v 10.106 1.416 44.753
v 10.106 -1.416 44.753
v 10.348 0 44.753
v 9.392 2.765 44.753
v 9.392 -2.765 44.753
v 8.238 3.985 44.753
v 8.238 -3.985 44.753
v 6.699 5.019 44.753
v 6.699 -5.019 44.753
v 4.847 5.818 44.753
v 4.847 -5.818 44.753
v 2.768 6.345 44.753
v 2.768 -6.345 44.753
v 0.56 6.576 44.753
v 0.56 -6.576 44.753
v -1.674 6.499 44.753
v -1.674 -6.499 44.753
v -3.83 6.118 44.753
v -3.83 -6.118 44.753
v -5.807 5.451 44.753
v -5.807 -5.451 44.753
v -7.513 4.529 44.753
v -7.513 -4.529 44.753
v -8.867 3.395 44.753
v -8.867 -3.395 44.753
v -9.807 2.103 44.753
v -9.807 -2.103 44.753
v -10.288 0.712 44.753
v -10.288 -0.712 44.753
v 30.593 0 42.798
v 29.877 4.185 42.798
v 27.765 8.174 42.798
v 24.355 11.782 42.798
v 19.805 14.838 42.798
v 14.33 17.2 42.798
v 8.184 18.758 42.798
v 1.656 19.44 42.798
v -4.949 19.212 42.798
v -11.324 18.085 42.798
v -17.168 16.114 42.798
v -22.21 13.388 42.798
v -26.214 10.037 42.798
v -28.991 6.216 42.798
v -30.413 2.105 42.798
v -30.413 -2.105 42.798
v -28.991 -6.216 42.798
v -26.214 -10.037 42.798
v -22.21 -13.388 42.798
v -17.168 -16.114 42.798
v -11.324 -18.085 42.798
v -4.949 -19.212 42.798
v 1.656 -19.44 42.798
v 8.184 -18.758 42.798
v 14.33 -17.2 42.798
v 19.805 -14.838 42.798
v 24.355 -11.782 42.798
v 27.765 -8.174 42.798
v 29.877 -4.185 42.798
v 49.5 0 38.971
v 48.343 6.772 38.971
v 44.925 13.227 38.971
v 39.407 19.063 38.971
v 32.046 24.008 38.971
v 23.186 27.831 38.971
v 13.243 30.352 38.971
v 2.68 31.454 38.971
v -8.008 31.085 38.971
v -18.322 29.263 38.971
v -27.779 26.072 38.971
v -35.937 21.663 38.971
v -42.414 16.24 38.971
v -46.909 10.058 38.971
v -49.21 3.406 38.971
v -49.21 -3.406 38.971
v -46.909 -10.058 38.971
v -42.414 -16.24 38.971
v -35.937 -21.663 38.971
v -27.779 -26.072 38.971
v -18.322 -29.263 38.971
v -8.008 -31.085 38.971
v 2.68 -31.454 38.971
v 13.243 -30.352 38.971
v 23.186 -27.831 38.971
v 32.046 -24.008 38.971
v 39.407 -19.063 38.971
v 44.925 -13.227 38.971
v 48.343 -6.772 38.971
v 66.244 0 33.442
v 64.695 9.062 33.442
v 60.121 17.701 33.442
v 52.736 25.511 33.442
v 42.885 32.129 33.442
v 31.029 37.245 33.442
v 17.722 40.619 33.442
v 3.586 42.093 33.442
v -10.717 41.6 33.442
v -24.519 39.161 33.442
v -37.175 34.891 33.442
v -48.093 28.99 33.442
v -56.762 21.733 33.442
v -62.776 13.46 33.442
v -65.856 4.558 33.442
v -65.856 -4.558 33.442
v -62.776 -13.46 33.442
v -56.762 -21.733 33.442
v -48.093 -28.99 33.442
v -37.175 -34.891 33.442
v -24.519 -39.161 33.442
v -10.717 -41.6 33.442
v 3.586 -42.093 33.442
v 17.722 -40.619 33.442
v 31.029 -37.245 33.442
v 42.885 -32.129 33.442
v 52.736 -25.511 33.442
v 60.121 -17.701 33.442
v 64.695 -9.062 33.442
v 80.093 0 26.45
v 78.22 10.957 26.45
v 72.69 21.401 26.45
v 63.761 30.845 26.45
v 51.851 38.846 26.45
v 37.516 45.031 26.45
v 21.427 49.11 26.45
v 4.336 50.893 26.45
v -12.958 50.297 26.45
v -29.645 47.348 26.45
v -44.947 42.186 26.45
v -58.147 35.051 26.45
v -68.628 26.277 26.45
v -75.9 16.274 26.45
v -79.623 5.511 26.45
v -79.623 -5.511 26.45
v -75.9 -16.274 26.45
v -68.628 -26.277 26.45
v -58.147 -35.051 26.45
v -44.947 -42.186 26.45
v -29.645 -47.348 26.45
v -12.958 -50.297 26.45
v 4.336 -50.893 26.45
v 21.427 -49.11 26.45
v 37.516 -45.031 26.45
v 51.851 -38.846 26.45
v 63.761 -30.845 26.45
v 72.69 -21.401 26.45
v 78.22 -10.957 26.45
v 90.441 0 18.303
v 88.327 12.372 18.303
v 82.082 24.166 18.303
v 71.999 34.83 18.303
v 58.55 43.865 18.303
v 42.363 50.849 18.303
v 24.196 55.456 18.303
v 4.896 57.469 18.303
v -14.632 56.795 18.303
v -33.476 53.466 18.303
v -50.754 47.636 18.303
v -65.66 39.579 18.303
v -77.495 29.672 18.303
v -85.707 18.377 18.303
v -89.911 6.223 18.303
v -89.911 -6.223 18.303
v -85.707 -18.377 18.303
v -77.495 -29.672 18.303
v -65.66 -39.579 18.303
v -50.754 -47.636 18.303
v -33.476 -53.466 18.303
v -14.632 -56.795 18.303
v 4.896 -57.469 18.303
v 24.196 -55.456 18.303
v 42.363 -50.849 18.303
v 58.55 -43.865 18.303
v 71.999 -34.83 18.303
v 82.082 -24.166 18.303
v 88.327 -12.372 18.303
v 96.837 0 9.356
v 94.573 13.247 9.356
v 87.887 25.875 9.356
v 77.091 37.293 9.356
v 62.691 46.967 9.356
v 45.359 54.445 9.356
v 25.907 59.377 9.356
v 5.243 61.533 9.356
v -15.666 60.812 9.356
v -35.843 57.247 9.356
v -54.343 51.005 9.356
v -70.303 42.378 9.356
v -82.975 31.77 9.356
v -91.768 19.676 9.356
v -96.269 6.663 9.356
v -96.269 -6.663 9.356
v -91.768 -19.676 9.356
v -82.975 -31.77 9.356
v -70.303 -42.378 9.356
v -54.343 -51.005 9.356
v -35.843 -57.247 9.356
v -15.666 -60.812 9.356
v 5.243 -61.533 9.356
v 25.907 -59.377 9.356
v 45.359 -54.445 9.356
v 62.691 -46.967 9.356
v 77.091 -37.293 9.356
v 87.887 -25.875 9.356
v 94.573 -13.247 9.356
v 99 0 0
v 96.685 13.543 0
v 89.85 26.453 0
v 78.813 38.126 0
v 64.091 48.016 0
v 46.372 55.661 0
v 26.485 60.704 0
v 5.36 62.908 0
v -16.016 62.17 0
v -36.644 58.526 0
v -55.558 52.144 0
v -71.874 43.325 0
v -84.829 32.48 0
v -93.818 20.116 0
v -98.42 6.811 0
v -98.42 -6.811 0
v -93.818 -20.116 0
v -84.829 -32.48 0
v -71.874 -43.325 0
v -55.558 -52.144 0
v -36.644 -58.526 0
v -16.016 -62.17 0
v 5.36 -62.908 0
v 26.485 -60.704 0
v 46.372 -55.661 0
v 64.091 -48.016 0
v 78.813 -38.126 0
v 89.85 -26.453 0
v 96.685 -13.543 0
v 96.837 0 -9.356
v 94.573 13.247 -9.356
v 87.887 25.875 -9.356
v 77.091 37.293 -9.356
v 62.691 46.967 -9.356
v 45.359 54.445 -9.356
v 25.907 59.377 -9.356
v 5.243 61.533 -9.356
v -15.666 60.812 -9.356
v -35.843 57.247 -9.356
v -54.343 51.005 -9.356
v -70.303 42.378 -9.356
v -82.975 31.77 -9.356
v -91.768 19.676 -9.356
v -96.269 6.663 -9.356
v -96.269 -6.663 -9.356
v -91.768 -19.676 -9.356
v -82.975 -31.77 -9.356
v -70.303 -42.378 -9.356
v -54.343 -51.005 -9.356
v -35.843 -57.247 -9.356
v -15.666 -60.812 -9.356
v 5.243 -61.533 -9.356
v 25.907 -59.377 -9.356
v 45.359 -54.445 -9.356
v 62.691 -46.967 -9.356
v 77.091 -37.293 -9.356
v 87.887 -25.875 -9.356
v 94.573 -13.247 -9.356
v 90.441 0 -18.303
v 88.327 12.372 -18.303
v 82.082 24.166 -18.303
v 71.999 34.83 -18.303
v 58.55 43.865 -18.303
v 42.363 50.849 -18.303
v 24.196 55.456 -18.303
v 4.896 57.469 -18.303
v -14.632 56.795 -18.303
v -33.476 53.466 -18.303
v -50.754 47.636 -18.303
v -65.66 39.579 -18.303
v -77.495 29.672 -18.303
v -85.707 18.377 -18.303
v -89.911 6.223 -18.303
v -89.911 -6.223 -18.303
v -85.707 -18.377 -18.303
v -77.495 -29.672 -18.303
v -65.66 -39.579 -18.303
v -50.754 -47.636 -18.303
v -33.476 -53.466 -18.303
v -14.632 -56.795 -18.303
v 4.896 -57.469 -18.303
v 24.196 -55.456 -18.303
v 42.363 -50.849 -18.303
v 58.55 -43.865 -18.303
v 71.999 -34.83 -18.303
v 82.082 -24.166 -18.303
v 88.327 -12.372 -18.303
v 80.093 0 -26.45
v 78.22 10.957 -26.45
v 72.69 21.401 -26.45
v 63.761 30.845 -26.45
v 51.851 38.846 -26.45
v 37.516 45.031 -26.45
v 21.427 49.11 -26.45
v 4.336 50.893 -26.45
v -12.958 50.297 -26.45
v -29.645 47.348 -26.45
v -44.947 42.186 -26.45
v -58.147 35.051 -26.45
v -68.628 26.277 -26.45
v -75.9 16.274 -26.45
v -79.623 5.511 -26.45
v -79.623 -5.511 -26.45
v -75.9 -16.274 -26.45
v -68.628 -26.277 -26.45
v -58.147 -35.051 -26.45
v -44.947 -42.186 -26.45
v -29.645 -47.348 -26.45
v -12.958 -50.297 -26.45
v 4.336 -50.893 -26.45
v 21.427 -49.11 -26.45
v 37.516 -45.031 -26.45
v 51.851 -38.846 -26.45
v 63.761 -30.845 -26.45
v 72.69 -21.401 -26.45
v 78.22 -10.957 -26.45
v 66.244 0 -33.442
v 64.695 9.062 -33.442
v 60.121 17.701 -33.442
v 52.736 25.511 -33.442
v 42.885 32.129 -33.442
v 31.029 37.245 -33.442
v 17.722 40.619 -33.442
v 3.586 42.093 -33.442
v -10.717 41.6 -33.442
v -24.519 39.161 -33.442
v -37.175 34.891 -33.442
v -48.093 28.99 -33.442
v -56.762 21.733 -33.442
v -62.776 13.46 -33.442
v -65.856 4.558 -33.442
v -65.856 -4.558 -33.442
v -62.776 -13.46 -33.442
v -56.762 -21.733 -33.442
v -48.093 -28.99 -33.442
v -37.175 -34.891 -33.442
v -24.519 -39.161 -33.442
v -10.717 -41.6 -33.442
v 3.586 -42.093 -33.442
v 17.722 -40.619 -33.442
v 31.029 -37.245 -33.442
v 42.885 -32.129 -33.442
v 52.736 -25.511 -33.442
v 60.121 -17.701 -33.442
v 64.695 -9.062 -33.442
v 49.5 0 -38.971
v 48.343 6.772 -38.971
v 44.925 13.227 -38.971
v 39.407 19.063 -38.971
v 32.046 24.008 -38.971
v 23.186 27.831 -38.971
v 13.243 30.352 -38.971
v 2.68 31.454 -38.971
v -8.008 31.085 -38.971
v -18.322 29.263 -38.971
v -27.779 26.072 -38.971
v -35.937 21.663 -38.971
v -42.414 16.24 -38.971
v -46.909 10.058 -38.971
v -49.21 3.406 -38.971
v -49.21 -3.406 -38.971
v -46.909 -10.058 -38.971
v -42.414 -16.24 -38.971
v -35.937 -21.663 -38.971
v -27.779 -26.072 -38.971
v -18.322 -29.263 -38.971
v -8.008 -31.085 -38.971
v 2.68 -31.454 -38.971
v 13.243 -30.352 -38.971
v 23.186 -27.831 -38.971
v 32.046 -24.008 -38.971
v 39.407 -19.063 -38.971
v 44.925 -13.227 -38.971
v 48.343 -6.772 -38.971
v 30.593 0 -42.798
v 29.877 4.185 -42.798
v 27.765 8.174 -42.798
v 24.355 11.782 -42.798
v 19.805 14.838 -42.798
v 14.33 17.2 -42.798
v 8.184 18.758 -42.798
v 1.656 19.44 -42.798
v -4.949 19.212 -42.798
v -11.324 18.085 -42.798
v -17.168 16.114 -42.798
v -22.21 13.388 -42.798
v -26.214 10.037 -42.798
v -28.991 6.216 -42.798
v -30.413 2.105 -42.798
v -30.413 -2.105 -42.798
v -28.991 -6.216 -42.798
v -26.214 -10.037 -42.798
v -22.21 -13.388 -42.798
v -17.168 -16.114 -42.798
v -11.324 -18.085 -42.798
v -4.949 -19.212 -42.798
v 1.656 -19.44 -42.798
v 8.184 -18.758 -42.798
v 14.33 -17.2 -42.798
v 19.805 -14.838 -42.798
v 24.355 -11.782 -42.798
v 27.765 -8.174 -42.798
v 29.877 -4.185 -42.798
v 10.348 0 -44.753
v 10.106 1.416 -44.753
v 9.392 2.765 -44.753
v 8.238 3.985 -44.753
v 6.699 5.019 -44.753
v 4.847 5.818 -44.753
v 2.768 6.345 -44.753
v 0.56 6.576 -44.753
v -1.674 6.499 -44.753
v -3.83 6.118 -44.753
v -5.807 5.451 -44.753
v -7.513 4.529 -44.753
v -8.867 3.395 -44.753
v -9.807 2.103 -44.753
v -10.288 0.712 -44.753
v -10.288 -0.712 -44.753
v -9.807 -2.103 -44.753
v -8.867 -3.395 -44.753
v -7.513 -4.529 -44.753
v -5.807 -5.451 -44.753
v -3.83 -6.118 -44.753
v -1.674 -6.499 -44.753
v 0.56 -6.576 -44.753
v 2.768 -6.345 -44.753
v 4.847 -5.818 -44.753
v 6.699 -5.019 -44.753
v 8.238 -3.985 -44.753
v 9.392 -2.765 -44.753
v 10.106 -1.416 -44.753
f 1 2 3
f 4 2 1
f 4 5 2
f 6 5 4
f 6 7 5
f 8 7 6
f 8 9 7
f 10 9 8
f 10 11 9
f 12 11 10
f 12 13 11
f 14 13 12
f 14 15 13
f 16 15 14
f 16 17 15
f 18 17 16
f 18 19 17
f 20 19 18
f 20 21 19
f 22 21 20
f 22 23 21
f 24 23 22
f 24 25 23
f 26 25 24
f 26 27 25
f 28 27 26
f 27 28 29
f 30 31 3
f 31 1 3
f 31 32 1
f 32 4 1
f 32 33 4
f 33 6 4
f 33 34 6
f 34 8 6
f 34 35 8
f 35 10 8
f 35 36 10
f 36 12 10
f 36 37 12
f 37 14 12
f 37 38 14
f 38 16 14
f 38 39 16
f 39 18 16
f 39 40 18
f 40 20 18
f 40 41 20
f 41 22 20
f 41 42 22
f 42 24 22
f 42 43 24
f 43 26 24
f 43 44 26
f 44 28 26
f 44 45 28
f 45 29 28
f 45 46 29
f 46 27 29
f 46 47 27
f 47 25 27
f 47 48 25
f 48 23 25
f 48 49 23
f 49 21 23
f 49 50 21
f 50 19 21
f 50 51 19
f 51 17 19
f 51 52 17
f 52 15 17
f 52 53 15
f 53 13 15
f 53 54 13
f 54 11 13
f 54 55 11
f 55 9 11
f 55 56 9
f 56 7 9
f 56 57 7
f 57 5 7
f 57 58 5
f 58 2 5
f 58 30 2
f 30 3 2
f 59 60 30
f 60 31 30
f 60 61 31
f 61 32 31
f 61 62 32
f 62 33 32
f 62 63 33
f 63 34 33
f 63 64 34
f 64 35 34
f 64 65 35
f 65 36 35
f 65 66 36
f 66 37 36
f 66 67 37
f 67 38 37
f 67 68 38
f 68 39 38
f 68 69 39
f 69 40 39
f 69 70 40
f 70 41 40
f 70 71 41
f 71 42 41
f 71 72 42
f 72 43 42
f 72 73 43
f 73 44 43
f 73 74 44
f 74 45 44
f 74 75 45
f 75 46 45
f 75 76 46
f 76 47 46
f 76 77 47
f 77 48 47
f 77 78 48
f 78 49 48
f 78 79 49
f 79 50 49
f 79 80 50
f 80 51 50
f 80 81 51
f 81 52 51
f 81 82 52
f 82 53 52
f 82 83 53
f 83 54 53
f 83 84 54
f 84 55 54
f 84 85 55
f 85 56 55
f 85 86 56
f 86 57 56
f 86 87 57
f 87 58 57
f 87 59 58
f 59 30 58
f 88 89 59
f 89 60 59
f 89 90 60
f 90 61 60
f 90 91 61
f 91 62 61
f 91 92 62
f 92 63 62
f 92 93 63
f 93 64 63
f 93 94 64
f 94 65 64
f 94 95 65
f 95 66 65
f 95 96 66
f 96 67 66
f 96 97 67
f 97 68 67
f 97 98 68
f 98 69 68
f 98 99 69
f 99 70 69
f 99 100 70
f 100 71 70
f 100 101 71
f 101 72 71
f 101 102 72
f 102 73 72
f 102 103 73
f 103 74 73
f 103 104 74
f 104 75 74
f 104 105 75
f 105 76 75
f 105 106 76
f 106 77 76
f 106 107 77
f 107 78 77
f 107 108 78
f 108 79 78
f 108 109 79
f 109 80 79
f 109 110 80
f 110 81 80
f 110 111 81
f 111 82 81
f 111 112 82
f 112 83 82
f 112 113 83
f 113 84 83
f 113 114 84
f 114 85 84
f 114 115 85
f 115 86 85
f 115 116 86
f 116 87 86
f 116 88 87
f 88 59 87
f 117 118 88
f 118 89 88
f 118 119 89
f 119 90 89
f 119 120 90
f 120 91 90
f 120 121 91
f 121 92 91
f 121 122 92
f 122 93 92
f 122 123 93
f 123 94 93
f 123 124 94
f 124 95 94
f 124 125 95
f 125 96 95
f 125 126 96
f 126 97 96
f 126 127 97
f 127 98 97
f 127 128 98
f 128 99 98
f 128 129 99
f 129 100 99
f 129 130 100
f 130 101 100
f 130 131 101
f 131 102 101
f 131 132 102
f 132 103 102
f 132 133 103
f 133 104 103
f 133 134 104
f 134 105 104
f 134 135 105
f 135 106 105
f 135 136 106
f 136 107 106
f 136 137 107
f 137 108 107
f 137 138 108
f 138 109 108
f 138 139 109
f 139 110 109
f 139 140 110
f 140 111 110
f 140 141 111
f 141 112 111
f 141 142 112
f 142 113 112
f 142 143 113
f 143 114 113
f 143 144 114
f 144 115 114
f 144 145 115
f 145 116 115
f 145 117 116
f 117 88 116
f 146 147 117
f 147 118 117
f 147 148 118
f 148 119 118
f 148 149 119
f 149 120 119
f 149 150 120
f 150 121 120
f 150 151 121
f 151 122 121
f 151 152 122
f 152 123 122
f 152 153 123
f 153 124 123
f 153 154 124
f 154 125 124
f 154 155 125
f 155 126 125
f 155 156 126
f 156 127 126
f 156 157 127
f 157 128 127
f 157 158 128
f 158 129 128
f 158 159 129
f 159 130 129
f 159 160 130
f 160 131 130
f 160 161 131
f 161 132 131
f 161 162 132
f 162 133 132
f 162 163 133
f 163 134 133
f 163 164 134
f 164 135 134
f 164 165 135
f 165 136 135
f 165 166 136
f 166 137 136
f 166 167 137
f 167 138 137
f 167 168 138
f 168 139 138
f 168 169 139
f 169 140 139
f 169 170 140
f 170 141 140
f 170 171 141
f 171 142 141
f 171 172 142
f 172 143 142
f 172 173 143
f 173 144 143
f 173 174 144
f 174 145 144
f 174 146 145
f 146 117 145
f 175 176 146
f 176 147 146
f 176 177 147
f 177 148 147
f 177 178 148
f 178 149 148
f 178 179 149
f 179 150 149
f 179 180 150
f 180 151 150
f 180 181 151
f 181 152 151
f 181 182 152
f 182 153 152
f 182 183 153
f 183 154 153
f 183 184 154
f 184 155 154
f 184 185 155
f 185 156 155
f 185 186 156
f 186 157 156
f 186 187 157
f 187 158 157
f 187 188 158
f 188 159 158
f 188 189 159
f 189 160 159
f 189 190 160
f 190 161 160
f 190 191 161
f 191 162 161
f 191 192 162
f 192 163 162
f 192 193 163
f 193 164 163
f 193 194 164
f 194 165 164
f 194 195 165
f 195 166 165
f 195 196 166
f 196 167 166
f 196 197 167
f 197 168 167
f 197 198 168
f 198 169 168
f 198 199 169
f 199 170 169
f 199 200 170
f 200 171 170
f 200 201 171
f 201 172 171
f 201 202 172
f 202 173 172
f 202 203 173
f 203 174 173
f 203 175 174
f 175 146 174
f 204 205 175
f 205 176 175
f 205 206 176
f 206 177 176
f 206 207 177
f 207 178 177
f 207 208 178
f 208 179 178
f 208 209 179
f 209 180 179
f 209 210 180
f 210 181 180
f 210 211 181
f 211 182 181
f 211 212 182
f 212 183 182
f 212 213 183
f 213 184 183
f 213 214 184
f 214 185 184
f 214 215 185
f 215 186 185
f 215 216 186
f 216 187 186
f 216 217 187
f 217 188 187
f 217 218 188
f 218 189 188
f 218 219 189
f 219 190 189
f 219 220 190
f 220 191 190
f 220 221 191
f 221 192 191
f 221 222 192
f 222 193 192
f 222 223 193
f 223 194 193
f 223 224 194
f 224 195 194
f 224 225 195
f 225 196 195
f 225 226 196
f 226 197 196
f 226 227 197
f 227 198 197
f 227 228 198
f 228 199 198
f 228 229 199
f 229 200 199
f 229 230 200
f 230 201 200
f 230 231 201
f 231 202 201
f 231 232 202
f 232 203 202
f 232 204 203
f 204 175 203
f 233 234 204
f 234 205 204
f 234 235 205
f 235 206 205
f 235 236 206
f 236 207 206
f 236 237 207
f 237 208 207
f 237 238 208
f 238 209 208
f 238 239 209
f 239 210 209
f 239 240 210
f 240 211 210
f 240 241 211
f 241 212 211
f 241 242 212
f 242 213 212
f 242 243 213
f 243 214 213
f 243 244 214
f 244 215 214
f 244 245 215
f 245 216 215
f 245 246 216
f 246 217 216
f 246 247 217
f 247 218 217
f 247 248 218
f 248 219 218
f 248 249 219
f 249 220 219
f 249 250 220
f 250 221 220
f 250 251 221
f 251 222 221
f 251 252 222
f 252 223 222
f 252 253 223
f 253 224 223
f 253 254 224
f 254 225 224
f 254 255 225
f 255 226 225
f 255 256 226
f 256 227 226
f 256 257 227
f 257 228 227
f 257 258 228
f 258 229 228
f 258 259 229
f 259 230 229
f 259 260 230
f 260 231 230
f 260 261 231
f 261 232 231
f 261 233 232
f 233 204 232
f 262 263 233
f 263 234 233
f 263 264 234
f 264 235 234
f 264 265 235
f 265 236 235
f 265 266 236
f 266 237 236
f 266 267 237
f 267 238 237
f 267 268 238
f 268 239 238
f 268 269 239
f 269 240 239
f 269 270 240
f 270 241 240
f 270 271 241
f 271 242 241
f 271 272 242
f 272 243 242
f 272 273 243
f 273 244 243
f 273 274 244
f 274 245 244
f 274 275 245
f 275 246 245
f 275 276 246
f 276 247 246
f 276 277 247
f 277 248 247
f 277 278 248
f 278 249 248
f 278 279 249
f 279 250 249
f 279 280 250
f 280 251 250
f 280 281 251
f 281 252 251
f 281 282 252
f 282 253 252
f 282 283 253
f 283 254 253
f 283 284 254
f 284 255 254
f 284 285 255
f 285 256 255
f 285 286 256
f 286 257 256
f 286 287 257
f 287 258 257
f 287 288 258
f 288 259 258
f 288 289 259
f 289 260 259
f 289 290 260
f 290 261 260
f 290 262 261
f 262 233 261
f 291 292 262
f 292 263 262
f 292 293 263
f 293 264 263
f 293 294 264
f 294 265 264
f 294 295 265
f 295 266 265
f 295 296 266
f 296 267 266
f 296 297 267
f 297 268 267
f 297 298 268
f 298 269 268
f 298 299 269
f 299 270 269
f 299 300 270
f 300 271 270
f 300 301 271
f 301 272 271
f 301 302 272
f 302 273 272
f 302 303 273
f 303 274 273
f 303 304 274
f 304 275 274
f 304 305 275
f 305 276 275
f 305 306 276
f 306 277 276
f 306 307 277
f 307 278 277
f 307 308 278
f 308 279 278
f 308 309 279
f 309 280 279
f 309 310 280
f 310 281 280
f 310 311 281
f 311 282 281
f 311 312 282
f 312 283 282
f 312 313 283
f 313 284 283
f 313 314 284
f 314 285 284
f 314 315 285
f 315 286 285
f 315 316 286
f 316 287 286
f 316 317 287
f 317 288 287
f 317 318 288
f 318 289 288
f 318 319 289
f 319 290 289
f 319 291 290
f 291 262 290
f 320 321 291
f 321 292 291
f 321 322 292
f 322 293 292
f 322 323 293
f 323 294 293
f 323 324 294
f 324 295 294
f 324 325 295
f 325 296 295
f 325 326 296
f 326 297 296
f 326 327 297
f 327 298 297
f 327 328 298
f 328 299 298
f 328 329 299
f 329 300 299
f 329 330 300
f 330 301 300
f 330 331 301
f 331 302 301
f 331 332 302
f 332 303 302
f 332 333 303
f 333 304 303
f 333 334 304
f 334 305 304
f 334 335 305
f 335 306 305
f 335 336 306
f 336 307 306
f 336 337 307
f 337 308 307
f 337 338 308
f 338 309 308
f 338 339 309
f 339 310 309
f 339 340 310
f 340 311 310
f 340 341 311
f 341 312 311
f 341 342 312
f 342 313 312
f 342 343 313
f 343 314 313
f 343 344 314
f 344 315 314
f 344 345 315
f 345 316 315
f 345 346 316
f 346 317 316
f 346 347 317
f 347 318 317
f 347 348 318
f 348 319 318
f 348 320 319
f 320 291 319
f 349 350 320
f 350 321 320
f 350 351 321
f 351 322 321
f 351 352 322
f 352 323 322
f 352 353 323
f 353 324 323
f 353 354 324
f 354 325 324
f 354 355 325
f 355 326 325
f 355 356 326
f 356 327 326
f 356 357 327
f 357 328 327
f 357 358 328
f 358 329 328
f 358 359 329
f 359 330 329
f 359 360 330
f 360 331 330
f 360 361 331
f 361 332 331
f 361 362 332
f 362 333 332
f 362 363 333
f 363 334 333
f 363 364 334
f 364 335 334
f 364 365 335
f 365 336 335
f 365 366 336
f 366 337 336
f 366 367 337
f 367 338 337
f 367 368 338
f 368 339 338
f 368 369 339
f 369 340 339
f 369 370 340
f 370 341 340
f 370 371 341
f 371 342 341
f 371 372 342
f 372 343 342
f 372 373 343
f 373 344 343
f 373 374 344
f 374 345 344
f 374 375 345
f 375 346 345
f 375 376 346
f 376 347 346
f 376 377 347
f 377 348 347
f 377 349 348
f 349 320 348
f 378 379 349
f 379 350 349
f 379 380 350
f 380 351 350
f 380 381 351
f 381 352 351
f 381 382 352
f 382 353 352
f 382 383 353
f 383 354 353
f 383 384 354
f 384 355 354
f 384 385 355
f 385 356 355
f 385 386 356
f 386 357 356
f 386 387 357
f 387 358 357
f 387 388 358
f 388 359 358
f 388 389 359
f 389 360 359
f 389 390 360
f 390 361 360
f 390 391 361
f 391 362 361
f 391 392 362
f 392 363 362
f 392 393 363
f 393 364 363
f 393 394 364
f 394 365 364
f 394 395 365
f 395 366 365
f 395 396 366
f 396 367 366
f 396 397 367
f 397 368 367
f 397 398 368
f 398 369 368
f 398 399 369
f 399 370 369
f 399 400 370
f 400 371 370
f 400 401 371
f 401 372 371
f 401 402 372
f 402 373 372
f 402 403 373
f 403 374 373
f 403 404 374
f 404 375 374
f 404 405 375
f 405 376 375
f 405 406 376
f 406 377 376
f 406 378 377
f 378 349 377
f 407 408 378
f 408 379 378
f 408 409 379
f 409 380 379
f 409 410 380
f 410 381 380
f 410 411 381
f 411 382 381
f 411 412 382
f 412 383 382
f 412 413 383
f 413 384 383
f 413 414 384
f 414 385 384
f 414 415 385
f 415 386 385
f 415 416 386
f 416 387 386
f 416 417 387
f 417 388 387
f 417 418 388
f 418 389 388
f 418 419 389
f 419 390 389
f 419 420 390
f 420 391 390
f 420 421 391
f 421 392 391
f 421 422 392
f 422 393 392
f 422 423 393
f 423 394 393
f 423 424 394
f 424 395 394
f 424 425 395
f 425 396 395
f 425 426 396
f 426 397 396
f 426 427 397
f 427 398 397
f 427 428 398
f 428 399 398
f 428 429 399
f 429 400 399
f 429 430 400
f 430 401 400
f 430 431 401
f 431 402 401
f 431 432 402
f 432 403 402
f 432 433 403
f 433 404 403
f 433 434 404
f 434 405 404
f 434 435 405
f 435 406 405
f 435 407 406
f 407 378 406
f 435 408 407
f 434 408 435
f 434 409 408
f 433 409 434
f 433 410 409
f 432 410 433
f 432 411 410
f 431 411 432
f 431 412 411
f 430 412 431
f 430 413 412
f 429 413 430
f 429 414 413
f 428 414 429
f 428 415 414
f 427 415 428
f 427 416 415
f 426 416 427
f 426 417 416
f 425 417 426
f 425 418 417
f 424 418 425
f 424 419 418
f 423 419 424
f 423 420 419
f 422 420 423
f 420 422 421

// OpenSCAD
// Generated by SolidPython 1.0.1 on 2020-07-29 00:46:49


scale(v = [11, 7, 5]) {
	sphere(r = 9);
}
/***********************************************
*********      SolidPython code:      **********
************************************************
 
# import packages: SolidPython
from solid import *
from solid.utils import *
from itertools import chain, combinations, permutations


class Resize:

    def __init__(self, scad_file):
        self.scad_file = scad_file
        #self.scad_file = import_scad(scad_file)
        # cone/cylinder param:
        self.r1 = 0
        self.r2 = 0
        self.h = 0
        # rectangular prism param:
        self.w = 0
        self.l = 0
        # ellipse param:
        self.r = 0

    # import OpenScad code (file name corresponds to shape)


    # classify shape + parameters
    def assign(self, param1, param2, param3):
        if self.scad_file == 'cone.scad':
            self.r1 = param1
            self.r2 = param2
            self.h = param3
        elif self.scad_file == 'cylinder.scad':
            self.r1 = param1
            self.r2 = param2
            self.h = param3
        elif self.scad_file == 'rectangularPrism.scad':
            self.h = param1
            self.l = param2
            self.w = param3
        else:
            self.r = param1
            self.h = param2

    # resize parameters
    def iterate(self):
        x = range(3, 20, 2)
        i = 1
        if self.scad_file == 'cone.scad':
            tempList = list(permutations(x, 2))
            for temp in tempList:
                param1 = temp[0]
                param2 = temp[1]
                filepath = 'produced_scad_files/' + 'cone' + str(param1) + '_' + str(param2) + '_' + '.scad'
                scad_render_to_file(cylinder(h=param1, r1=param2, r2=0), filepath)

        elif self.scad_file == 'cylinder.scad':
            tempList = list(permutations(x, 3))
            for temp in tempList:
                param1 = temp[0]
                param2 = temp[1]
                filepath = 'produced_scad_files/' + 'cylinder' + str(param1) + '_' + str(param2) + '_' + '.scad'
                scad_render_to_file(cylinder(h=param1, r1=param2, r2=param2), filepath)

        elif self.scad_file == 'rectangularPrism.scad':
            tempList = list(permutations(x, 3))
            for temp in tempList:
                param1 = temp[0]
                param2 = temp[1]
                param3 = temp[2]
                filepath = 'produced_scad_files/' + 'rectangularPrism' + str(param1) + '_' + str(param2) + '_' + str(
                    param3) + '.scad'
                scad_render_to_file(cube(size=(param1, param2, param3)), filepath)

        elif self.scad_file == 'ellipse.scad':
            tempList = list(permutations(x, 4))
            for temp in tempList:
                param1 = temp[0]
                param2 = temp[1]
                param3 = temp[2]
                param4 = temp[3]
                filepath = 'produced_scad_files/' + 'ellipse' + str(param1) + '_' + str(param2) + '_' + str(param3) + '_' + str(param4) + '.scad'
                scad_render_to_file(scale([param1, param2, param3])(sphere(r=param4)), filepath)

    def render_to_scadfile(self):
        scad_render_to_file(scad, 'example.scad') 
 
************************************************/
